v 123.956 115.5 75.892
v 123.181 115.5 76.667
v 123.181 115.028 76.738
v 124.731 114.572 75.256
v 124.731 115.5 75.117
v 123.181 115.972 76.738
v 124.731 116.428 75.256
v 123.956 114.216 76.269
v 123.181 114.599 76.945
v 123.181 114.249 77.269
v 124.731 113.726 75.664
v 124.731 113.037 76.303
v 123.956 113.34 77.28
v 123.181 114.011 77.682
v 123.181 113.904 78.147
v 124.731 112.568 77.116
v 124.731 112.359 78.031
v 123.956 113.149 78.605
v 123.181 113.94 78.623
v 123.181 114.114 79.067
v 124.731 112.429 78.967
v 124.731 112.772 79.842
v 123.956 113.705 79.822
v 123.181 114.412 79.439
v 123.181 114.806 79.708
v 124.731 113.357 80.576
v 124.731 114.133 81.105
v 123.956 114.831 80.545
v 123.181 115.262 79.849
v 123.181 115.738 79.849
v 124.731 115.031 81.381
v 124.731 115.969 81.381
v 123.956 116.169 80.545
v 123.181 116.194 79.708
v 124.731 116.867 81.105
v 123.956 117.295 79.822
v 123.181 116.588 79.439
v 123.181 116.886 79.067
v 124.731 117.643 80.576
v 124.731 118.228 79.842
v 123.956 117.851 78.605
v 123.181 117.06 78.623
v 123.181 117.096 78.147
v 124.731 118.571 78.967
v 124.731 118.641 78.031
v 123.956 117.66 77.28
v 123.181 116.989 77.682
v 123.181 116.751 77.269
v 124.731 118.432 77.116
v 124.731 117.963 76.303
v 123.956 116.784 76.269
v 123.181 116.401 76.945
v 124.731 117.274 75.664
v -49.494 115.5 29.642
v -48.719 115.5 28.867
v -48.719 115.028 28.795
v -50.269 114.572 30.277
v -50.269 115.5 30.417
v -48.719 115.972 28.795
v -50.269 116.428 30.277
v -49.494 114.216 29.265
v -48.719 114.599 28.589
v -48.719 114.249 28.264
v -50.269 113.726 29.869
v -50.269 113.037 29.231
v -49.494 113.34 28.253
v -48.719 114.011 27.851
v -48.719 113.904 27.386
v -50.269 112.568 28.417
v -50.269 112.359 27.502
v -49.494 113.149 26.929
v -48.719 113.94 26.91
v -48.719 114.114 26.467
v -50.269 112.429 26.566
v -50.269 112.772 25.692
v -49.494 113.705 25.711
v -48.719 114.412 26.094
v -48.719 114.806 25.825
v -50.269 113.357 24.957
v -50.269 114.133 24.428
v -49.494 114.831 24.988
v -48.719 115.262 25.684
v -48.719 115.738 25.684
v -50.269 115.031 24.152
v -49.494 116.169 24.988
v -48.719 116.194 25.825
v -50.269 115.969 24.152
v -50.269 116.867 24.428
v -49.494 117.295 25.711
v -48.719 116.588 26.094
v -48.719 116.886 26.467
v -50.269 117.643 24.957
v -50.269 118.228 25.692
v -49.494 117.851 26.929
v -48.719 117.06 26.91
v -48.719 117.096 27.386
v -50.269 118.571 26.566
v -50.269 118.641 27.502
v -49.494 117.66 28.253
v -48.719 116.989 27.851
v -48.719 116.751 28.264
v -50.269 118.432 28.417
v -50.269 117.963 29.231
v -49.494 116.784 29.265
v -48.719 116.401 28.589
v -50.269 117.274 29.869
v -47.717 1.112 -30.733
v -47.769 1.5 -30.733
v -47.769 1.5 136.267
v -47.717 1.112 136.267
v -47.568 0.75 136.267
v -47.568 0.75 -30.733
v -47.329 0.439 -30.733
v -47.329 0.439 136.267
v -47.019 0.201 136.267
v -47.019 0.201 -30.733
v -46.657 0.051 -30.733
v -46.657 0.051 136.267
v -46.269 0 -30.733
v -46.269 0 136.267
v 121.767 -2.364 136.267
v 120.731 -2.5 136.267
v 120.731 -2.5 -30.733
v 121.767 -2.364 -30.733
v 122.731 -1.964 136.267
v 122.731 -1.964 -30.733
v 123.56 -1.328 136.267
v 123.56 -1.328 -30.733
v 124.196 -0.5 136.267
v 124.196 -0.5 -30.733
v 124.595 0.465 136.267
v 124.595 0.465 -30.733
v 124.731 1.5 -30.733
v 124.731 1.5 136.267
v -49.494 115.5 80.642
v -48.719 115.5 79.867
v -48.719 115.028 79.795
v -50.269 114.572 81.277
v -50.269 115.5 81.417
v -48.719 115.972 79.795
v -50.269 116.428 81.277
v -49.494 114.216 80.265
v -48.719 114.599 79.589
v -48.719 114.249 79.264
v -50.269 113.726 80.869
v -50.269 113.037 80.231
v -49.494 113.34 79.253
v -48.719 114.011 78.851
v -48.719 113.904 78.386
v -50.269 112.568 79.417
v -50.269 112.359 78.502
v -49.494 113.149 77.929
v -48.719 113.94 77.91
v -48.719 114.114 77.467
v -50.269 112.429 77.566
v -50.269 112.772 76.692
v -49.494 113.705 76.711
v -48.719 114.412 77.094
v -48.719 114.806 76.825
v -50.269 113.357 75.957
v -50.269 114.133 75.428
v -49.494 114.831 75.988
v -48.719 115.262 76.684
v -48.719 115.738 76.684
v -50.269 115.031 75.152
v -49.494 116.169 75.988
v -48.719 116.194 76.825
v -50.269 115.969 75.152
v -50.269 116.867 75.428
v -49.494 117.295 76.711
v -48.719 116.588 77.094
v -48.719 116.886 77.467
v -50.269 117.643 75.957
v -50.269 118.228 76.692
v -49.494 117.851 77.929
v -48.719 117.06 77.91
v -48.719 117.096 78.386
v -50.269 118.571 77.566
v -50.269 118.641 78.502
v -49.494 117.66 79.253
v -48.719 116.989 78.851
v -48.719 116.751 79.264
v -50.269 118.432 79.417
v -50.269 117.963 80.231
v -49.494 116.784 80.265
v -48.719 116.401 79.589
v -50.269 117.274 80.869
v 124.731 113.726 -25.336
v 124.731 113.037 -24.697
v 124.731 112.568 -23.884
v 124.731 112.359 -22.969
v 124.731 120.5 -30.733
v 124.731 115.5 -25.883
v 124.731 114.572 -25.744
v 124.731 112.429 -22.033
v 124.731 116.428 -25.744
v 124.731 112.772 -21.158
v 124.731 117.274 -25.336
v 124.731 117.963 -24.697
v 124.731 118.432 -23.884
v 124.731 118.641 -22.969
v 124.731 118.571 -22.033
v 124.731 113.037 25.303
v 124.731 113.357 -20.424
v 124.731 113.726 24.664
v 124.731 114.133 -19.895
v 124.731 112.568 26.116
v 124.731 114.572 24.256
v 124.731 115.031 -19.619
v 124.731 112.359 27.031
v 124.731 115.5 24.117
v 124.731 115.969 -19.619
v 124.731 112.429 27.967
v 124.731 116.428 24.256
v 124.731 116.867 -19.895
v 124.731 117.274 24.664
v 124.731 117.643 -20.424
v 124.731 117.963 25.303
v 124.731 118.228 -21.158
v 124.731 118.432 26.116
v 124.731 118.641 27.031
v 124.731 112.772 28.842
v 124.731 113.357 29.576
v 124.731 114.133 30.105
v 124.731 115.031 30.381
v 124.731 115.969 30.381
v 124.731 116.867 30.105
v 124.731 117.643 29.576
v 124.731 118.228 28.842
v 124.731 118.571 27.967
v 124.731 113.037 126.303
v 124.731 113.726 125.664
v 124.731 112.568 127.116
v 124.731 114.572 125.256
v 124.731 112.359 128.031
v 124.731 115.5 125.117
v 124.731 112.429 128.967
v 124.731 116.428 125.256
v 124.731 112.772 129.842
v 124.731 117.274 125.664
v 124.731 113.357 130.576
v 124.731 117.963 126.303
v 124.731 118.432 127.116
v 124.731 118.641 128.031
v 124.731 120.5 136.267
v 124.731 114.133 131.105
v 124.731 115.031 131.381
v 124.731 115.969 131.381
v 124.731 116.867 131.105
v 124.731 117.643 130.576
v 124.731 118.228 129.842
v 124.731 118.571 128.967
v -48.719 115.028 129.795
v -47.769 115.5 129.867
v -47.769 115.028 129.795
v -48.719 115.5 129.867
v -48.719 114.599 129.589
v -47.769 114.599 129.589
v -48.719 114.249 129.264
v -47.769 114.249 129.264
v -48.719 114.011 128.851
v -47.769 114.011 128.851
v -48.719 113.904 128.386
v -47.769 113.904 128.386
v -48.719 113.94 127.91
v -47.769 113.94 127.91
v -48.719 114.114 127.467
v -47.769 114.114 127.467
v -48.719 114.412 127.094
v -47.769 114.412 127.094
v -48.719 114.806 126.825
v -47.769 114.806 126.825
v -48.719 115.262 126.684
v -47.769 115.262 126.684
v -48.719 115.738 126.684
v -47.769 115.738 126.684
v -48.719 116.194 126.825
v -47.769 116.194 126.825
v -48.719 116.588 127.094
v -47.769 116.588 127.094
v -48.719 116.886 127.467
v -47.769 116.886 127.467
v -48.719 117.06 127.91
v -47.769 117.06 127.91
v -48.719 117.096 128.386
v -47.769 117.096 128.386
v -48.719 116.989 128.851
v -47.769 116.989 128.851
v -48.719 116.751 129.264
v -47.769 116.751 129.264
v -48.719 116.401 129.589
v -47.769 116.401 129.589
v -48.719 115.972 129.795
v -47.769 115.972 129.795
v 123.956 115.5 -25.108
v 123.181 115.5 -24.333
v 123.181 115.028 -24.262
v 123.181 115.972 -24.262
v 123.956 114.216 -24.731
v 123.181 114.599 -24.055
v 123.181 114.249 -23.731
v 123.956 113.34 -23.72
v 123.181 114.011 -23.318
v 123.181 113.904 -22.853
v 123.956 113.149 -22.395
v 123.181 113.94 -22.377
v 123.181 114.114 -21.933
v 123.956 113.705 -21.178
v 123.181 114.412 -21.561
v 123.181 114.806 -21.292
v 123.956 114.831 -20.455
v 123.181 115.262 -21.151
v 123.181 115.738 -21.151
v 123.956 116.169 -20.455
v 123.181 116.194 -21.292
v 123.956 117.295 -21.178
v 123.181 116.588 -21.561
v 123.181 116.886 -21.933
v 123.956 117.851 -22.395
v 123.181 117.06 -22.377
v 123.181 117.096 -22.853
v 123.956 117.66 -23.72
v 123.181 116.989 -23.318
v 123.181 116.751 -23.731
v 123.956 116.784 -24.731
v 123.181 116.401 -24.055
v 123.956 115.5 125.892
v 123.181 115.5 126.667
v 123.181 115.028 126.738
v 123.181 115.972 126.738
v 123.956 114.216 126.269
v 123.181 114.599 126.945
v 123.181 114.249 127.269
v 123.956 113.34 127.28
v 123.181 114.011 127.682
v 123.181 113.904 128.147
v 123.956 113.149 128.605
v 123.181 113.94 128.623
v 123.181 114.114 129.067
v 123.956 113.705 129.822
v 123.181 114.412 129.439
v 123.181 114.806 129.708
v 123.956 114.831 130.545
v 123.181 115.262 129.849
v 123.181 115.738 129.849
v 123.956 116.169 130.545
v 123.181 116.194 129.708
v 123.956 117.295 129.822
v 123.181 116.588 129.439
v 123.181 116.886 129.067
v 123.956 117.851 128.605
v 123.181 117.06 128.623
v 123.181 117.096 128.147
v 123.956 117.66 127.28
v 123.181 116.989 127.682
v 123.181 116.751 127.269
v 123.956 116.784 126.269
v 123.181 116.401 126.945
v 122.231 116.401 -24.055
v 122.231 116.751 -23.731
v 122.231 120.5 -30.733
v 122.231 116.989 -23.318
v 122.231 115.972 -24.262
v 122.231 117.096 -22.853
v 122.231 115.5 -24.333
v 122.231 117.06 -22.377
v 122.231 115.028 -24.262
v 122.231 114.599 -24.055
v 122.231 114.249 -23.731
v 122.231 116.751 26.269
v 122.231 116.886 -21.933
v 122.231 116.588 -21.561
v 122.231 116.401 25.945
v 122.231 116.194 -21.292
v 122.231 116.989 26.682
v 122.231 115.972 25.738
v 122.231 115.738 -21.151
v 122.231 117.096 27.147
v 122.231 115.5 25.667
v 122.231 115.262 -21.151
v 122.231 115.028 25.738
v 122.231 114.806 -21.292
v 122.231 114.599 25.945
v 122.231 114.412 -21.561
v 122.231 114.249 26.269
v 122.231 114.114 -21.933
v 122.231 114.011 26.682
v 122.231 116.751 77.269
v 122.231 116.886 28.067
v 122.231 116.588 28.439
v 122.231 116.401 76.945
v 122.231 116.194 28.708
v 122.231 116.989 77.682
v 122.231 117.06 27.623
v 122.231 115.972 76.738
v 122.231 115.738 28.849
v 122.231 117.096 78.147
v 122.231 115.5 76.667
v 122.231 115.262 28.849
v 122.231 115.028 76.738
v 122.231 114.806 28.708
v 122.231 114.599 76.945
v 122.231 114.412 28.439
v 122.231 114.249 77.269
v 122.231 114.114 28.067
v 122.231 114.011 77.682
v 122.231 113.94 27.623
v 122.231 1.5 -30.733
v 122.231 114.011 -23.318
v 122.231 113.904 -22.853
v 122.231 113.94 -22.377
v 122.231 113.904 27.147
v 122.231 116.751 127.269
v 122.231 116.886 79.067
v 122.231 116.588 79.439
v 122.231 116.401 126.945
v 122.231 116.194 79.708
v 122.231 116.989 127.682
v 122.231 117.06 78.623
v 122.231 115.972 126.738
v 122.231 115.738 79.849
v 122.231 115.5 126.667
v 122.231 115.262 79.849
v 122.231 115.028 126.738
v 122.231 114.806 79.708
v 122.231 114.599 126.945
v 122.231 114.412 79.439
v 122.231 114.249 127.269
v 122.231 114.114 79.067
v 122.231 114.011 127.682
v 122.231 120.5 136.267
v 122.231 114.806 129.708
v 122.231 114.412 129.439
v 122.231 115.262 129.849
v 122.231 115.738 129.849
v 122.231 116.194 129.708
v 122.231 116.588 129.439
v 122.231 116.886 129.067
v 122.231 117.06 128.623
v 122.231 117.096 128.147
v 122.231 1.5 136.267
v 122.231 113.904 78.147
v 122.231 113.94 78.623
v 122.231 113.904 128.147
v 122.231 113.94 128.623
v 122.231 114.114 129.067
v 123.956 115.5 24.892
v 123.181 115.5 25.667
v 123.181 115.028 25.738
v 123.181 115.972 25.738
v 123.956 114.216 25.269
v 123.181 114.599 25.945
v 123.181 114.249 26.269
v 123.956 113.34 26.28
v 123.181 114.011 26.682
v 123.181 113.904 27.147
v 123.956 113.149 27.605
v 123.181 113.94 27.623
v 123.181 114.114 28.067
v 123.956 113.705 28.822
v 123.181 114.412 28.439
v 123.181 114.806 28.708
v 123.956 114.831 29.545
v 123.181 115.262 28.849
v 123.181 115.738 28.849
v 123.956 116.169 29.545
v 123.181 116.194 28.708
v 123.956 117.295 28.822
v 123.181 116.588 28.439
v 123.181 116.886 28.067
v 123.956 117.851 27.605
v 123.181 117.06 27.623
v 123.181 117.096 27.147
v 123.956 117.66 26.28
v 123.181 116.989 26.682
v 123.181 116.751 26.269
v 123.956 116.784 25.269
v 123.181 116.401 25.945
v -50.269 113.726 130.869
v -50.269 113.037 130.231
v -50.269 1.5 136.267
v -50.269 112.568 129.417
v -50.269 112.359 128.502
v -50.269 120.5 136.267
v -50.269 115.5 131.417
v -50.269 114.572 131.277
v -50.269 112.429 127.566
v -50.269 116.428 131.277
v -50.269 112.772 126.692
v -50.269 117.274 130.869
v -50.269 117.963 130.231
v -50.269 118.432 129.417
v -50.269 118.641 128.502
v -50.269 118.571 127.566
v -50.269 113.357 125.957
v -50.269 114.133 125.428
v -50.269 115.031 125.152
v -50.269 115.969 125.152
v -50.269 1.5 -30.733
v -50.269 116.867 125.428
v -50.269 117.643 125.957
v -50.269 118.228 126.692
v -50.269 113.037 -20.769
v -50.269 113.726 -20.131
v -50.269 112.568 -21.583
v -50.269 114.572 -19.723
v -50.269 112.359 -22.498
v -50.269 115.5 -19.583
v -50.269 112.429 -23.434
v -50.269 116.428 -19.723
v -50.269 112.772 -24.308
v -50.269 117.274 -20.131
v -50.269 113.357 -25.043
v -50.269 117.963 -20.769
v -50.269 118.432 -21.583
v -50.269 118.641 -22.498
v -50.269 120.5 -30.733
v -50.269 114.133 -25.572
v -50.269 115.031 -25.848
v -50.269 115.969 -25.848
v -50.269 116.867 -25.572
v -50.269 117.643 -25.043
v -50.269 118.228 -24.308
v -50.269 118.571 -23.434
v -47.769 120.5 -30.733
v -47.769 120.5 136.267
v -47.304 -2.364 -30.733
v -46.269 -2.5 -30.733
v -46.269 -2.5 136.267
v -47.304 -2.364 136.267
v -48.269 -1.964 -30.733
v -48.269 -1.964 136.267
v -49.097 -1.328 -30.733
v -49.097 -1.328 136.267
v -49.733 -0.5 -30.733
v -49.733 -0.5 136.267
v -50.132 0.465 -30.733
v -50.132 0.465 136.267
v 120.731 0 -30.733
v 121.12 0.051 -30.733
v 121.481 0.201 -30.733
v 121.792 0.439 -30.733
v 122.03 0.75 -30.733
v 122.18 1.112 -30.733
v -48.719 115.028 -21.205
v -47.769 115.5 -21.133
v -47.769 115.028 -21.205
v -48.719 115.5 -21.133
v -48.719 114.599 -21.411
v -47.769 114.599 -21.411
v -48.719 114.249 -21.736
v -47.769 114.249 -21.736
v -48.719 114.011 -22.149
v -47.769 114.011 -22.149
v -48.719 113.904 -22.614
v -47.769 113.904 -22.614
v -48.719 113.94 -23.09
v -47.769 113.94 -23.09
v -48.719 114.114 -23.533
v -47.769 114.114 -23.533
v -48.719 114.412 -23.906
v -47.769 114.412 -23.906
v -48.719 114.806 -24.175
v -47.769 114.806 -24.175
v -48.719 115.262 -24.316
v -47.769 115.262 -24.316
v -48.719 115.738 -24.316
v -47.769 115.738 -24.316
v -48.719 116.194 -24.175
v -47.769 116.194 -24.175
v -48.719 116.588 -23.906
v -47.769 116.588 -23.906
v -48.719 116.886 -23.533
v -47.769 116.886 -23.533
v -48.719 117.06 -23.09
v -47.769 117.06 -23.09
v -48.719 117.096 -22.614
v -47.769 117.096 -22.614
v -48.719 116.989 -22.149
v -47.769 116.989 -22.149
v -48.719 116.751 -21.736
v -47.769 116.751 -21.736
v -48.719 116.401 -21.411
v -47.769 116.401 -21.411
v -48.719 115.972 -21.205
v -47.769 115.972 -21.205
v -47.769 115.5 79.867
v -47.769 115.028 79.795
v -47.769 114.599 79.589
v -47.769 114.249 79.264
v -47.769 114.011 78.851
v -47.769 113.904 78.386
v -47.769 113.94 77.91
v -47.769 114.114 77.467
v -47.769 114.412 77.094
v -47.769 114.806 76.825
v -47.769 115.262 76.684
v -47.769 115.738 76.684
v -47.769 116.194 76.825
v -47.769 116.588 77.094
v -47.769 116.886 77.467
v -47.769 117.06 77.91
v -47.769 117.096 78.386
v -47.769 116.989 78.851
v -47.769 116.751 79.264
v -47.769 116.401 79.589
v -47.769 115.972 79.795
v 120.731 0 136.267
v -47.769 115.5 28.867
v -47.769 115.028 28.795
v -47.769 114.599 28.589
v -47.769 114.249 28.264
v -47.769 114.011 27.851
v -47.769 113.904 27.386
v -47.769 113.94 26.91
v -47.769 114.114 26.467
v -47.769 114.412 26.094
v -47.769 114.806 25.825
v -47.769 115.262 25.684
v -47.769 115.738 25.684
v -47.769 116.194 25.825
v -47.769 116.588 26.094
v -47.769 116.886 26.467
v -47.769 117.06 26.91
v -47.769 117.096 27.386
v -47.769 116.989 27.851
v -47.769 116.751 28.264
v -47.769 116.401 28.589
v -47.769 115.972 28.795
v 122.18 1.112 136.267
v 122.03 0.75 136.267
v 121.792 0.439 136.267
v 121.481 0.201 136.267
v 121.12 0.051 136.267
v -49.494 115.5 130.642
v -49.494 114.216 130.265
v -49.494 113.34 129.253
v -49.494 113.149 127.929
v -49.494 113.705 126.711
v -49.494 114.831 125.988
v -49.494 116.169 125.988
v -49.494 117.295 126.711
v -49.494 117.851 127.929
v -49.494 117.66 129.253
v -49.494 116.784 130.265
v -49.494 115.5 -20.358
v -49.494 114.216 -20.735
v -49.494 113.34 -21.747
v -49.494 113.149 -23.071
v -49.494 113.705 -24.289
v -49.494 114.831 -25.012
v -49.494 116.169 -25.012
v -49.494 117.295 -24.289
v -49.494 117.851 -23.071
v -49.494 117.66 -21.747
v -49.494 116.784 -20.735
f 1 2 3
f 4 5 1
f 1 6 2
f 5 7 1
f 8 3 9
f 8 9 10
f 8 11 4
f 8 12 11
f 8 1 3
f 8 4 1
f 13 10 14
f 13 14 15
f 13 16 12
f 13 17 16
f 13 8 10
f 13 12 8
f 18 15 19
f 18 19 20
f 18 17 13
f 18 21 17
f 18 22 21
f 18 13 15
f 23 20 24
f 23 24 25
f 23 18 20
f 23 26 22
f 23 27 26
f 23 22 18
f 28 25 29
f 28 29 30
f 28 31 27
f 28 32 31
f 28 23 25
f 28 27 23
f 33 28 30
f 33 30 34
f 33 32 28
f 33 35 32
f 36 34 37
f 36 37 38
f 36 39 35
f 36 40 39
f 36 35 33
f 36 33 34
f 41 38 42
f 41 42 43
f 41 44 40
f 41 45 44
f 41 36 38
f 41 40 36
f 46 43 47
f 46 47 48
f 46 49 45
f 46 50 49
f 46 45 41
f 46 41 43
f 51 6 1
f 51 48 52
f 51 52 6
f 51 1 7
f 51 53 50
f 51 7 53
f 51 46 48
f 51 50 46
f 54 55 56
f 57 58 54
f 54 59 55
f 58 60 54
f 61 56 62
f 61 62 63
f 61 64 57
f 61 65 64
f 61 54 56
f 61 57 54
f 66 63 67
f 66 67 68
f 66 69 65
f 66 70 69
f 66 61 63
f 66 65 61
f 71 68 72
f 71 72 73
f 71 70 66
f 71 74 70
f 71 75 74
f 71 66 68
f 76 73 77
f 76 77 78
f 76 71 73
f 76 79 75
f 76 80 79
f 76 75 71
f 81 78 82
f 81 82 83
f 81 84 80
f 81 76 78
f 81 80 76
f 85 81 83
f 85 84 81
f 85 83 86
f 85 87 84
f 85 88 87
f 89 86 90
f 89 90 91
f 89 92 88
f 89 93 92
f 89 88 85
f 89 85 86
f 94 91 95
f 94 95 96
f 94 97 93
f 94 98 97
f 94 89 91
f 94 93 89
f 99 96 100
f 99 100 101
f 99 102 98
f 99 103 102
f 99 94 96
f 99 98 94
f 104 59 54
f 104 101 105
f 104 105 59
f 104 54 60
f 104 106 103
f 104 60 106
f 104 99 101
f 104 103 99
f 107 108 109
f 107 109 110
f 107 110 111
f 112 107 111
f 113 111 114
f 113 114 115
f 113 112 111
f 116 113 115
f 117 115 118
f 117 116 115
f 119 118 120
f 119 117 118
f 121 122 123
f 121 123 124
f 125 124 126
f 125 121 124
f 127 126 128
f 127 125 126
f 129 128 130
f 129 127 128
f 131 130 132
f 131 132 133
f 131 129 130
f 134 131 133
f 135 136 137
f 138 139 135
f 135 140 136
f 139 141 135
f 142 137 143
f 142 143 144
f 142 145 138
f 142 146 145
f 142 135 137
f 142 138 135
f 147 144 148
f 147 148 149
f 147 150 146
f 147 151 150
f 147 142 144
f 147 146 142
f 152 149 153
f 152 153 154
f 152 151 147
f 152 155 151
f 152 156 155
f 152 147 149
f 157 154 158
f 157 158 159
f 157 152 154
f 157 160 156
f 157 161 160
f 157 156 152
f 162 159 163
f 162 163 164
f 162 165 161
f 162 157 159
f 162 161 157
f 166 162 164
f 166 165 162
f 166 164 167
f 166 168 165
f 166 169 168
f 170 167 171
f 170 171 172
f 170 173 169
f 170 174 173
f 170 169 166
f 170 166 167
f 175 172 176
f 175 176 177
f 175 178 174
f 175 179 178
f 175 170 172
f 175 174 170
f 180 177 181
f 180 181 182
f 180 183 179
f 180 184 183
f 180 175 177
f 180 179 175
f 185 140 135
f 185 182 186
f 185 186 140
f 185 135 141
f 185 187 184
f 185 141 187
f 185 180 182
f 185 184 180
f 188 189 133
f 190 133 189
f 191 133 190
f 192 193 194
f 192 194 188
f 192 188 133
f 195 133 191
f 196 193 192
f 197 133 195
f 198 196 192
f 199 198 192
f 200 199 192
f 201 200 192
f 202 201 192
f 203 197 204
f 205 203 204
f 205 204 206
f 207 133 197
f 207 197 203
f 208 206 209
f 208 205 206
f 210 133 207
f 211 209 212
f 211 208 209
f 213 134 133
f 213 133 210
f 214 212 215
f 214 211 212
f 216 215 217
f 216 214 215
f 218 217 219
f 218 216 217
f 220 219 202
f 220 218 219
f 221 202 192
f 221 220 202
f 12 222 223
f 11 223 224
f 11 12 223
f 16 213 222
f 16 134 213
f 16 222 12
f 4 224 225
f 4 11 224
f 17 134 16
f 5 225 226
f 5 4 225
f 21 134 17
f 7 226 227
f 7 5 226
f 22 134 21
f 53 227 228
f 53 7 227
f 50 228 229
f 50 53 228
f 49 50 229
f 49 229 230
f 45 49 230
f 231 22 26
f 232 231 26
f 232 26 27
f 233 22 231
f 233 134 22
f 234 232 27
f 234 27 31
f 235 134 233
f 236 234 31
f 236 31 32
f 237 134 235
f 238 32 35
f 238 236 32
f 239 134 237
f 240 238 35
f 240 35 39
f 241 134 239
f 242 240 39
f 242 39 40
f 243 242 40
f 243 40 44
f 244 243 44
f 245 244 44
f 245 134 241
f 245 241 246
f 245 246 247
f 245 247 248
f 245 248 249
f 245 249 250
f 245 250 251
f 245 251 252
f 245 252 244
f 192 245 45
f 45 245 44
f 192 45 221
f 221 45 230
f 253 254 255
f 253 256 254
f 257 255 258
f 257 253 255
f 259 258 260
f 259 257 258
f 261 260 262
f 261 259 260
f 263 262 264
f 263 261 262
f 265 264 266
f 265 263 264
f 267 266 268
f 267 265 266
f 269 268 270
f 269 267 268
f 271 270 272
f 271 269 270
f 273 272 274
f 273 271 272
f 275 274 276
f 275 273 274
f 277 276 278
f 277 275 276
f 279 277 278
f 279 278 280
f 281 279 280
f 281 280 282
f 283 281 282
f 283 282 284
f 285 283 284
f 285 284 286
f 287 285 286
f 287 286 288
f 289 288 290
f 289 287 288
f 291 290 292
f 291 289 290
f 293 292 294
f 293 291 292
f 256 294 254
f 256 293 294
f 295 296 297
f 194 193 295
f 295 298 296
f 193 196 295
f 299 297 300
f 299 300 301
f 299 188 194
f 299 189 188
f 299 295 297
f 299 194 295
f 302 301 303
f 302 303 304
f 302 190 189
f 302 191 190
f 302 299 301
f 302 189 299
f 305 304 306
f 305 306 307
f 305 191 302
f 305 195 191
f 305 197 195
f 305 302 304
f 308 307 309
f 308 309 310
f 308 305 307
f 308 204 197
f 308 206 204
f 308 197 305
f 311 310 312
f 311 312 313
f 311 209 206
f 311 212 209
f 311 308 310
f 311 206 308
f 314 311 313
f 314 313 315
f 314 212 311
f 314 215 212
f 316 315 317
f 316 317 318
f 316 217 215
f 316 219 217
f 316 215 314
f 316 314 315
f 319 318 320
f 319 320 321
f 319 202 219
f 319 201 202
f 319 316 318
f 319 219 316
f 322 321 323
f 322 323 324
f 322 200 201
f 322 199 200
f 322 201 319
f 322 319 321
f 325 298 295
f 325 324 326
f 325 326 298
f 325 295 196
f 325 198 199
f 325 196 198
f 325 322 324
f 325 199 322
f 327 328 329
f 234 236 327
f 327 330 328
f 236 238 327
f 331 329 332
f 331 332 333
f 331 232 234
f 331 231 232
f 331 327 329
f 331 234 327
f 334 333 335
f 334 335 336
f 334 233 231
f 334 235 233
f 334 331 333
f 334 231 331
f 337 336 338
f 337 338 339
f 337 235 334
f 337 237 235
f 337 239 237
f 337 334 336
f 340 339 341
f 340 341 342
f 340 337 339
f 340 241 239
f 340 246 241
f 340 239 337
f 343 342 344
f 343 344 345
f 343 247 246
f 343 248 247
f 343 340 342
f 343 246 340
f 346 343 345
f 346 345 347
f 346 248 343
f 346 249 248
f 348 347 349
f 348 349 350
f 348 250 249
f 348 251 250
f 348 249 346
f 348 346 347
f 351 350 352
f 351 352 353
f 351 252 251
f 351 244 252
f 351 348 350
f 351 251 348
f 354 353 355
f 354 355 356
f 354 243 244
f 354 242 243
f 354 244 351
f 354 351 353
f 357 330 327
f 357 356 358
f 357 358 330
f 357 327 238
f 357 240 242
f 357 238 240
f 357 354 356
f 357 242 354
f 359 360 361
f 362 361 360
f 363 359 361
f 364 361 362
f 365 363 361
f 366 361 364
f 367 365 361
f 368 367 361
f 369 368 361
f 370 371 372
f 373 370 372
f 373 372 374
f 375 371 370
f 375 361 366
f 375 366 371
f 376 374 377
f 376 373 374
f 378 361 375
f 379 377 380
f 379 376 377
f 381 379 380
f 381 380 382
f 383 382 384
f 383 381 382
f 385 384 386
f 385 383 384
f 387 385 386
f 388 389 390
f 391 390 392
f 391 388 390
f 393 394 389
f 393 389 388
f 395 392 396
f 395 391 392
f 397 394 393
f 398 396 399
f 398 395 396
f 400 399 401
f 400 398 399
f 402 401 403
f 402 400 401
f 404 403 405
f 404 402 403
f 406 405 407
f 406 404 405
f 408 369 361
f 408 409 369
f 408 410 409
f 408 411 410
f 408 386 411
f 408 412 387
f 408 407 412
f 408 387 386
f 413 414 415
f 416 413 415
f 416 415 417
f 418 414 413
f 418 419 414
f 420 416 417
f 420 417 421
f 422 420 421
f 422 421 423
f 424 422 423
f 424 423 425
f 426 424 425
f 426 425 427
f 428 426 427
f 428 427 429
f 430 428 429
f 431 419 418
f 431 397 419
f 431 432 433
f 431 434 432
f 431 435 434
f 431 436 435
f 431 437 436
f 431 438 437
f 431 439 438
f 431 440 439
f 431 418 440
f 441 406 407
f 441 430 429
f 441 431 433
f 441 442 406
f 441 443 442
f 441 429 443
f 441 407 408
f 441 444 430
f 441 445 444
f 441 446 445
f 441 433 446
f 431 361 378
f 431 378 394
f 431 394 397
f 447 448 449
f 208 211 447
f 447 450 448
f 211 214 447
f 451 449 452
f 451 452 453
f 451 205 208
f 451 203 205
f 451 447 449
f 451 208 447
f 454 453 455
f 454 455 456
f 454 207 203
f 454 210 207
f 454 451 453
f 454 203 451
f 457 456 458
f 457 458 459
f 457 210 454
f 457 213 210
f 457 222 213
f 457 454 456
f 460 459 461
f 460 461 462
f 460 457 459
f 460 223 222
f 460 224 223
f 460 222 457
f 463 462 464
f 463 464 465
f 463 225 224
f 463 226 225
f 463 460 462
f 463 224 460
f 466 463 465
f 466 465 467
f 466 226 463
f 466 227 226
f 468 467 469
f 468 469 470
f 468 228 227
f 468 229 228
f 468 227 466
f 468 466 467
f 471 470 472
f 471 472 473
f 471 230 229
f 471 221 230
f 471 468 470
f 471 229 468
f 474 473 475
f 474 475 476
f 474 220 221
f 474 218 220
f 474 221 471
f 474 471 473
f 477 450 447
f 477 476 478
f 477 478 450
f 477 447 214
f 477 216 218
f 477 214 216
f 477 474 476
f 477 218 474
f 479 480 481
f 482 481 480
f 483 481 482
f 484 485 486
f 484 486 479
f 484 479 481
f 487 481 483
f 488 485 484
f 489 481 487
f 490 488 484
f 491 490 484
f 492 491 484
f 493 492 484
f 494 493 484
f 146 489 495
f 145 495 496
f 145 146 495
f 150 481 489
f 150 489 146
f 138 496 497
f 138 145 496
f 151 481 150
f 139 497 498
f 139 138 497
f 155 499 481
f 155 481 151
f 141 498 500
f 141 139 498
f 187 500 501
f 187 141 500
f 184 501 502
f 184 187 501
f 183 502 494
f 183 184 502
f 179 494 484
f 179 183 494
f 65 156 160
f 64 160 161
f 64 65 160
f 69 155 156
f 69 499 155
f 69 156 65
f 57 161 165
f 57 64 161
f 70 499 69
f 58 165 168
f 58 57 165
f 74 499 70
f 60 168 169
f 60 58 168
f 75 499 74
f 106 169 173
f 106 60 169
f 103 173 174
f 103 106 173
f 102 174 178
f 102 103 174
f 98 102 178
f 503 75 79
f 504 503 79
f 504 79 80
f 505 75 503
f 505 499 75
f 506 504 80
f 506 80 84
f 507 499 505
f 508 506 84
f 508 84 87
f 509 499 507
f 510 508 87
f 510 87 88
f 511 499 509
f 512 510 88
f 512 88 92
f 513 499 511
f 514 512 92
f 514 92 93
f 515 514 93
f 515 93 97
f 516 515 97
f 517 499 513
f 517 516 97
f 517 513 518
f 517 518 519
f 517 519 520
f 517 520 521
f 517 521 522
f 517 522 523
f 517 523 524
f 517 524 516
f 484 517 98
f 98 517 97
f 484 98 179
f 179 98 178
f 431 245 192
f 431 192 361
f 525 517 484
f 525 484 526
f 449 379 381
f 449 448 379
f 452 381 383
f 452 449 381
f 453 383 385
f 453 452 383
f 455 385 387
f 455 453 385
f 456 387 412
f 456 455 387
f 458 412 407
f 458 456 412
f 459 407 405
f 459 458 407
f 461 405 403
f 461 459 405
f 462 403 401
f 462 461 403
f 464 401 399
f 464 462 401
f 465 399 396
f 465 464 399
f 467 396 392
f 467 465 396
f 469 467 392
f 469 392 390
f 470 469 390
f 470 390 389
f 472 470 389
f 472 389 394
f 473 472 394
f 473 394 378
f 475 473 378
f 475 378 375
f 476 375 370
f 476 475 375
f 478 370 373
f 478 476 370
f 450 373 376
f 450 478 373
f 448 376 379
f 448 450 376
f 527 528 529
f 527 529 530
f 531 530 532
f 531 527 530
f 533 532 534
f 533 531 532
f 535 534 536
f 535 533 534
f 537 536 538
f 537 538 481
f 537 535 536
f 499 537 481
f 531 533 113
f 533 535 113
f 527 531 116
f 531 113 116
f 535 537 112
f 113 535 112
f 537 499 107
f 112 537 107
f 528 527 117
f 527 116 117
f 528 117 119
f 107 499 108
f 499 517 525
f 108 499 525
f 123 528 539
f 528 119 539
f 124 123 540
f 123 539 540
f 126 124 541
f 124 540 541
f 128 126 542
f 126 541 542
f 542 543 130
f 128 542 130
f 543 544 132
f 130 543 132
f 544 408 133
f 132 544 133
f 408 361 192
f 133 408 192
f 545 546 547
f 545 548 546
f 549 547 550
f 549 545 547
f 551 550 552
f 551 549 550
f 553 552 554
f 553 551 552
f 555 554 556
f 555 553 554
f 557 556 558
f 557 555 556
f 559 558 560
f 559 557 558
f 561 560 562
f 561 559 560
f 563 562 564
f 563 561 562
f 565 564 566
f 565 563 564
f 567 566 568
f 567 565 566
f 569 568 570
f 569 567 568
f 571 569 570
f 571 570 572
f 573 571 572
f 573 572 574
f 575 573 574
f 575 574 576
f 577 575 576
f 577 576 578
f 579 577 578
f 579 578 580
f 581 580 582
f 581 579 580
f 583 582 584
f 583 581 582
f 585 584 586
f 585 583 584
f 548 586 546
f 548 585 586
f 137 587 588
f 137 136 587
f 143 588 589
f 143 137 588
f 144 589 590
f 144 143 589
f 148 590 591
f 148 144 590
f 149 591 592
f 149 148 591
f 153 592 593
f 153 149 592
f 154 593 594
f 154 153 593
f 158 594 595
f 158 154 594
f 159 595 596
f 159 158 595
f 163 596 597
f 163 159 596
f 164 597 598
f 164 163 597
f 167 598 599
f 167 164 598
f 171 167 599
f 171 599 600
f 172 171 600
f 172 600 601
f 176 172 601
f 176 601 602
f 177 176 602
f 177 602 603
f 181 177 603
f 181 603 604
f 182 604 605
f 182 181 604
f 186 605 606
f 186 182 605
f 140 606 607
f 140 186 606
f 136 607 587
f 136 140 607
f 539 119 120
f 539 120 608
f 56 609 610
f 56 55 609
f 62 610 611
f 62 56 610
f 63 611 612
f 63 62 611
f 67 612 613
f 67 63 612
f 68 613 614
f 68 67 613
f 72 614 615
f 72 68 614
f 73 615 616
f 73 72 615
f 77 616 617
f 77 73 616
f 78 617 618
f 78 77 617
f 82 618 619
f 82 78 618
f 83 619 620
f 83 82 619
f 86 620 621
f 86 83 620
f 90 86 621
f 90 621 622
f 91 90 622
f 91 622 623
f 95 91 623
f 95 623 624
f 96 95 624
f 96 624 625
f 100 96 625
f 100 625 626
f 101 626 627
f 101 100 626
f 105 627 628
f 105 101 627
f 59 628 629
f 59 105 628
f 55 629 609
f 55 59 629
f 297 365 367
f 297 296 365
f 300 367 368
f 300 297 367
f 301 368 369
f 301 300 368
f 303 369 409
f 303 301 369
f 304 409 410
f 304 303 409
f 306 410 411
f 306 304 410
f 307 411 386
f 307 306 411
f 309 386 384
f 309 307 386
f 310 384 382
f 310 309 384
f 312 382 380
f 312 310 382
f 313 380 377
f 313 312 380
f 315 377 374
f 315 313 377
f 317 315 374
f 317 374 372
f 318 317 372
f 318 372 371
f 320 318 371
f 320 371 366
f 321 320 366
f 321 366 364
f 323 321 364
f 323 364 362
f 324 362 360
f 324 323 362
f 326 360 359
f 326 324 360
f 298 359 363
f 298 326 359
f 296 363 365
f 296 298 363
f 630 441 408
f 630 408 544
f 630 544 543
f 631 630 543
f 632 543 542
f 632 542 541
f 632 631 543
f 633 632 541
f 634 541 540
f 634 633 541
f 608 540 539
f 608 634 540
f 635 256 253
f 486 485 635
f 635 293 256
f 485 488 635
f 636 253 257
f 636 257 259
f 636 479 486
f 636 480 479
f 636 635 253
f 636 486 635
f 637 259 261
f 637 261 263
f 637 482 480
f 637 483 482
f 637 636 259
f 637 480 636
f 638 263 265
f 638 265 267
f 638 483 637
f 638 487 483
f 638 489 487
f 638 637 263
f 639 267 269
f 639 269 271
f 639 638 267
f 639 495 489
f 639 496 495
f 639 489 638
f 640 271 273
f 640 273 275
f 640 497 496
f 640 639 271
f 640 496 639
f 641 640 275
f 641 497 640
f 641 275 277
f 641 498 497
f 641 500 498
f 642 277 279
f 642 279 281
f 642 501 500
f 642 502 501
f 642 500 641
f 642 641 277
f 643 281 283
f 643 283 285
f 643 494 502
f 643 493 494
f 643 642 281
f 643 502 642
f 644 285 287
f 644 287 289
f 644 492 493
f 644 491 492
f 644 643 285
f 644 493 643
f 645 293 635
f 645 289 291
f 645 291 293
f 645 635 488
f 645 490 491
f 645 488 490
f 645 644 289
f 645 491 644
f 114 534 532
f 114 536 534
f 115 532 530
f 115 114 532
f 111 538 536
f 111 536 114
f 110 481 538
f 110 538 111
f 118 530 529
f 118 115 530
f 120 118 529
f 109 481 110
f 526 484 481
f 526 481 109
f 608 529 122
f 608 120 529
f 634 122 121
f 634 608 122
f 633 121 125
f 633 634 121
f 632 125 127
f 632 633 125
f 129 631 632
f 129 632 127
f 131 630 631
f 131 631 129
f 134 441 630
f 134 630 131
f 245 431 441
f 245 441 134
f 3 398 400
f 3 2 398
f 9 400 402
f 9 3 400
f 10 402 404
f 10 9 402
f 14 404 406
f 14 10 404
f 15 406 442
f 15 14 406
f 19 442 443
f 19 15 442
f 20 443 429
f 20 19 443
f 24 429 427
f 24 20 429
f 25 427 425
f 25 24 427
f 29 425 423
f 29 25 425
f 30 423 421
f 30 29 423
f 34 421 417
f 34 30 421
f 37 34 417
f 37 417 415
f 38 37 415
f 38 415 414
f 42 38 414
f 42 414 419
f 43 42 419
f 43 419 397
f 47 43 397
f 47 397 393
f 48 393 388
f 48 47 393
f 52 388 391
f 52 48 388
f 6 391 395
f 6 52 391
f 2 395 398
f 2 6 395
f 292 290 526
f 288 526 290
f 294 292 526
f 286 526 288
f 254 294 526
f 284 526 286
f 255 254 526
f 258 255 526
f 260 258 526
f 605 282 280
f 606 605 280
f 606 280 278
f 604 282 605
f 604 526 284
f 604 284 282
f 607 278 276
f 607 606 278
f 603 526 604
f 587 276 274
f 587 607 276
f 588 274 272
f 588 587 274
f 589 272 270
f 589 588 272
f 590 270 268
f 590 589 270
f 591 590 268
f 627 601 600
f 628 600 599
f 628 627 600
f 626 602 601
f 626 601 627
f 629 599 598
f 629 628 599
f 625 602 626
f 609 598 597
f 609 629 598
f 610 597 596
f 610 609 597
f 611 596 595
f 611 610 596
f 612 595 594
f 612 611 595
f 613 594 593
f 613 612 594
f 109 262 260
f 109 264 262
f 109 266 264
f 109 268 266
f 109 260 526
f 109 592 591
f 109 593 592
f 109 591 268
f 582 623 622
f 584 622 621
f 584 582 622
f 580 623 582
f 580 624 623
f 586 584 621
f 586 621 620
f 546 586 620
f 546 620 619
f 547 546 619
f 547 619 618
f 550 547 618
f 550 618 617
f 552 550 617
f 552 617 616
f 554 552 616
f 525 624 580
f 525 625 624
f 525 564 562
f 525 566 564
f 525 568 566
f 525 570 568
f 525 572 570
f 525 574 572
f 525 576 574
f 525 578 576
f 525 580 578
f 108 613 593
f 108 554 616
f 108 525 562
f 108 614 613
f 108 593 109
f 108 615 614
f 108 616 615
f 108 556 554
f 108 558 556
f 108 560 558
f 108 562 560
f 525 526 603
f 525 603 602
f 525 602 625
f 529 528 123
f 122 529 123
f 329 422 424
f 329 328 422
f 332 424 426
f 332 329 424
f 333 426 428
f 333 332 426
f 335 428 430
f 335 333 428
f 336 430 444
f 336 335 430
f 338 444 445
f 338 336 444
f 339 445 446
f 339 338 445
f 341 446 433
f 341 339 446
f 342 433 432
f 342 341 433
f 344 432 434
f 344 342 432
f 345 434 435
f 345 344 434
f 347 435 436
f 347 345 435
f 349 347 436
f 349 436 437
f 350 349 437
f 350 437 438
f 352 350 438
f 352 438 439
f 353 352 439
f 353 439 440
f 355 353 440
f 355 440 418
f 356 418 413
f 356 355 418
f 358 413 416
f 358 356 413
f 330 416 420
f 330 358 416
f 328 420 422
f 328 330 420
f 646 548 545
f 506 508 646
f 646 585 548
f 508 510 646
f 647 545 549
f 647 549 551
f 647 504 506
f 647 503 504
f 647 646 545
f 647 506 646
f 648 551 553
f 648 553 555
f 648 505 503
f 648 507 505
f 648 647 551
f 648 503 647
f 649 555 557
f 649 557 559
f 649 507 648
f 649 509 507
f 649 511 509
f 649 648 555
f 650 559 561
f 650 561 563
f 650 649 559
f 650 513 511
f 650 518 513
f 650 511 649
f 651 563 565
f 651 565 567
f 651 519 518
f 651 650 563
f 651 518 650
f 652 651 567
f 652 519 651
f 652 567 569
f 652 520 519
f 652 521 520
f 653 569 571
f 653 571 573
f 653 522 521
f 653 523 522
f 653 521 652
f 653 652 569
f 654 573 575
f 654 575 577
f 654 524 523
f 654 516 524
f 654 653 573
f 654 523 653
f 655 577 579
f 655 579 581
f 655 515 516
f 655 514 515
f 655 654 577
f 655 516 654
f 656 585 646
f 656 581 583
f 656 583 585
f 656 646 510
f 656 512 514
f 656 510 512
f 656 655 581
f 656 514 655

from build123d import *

# Parameters (mm, degrees)
SKETCH_238_W                                   = 170
SKETCH_238_H                                   = 167
BASE_FLANGE1_DEPTH                             = 2.5
EDGE_FLANGE1_STRIP_W                           = 13
EDGE_FLANGE1_STRIP_H                           = 2.5
EDGE_FLANGE1_STRIP_CUT_DEPTH                   = 167
EDGE_FLANGE1_DEPTH                             = 167
EDGE_FLANGE2_STRIP_W                           = 13
EDGE_FLANGE2_STRIP_H                           = 2.5
EDGE_FLANGE2_STRIP_CUT_DEPTH                   = 167
EDGE_FLANGE2_DEPTH                             = 167
CSK_FOR_M3_FLAT_HEAD_MACHINE_SCREW1_AT_2_COUNT = 2
CSK_FOR_M3_FLAT_HEAD_MACHINE_SCREW1_AT_2_PITCH = 50
CSK_FOR_M3_FLAT_HEAD_MACHINE_SCREW1_AT_3_COUNT = 2
CSK_FOR_M3_FLAT_HEAD_MACHINE_SCREW1_AT_3_PITCH = 101
CSK_FOR_M3_FLAT_HEAD_MACHINE_SCREW1_AT_4_COUNT = 2
CSK_FOR_M3_FLAT_HEAD_MACHINE_SCREW1_AT_4_PITCH = 151
CSK_FOR_M3_FLAT_HEAD_MACHINE_SCREW2_AT_2_COUNT = 2
CSK_FOR_M3_FLAT_HEAD_MACHINE_SCREW2_AT_2_PITCH = 50
CSK_FOR_M3_FLAT_HEAD_MACHINE_SCREW2_AT_3_COUNT = 2
CSK_FOR_M3_FLAT_HEAD_MACHINE_SCREW2_AT_3_PITCH = 101
CSK_FOR_M3_FLAT_HEAD_MACHINE_SCREW2_AT_4_COUNT = 2
CSK_FOR_M3_FLAT_HEAD_MACHINE_SCREW2_AT_4_PITCH = 151


# Sheet-metal steps are written as plain solids
with BuildPart() as part:
    # Sketch 238 → Base-Flange1 (new body)
    with BuildSketch(Plane(origin=(0, 0, 0), x_dir=(1, 0, 0), z_dir=(0, 1, 0))):
        with Locations((37.231404959, -52.766528926)):
            Rectangle(SKETCH_238_W, SKETCH_238_H)
    extrude(amount=-BASE_FLANGE1_DEPTH)

    # Edge-Flange1 strip (across the edge) → Edge-Flange1 strip cut (cut)
    with BuildSketch(Plane(origin=(-47.768595041, 0, -30.733471074), x_dir=(1, 0, 0), z_dir=(0, 0, 1))):
        with Locations((-5, -1.25)):
            Rectangle(EDGE_FLANGE1_STRIP_W, EDGE_FLANGE1_STRIP_H)
    extrude(amount=EDGE_FLANGE1_STRIP_CUT_DEPTH, mode=Mode.SUBTRACT)

    # Edge-Flange1 section (across the edge) → Edge-Flange1 (add)
    with BuildSketch(Plane(origin=(-47.768595041, 0, -30.733471074), x_dir=(1, 0, 0), z_dir=(0, 0, 1))):
        with BuildLine():
            Line((-2.5, 1.5), (-2.5, 120.5))
            Line((-2.5, 120.5), (0, 120.5))
            Line((0, 120.5), (0, 1.5))
            ThreePointArc((0, 1.5), (0.439339828, 0.439339828), (1.5, 0))
            Line((1.5, 0), (1.5, -2.5))
            ThreePointArc((1.5, -2.5), (-1.328427125, -1.328427125), (-2.5, 1.5))
        make_face()
    extrude(amount=EDGE_FLANGE1_DEPTH)

    # Edge-Flange2 strip (across the edge) → Edge-Flange2 strip cut (cut)
    with BuildSketch(Plane(origin=(122.231404959, 0, 136.266528926), x_dir=(-1, 0, 0), z_dir=(0, 0, -1))):
        with Locations((-5, -1.25)):
            Rectangle(EDGE_FLANGE2_STRIP_W, EDGE_FLANGE2_STRIP_H)
    extrude(amount=EDGE_FLANGE2_STRIP_CUT_DEPTH, mode=Mode.SUBTRACT)

    # Edge-Flange2 section (across the edge) → Edge-Flange2 (add)
    with BuildSketch(Plane(origin=(122.231404959, 0, 136.266528926), x_dir=(-1, 0, 0), z_dir=(0, 0, -1))):
        with BuildLine():
            Line((-2.5, 1.5), (-2.5, 120.5))
            Line((-2.5, 120.5), (0, 120.5))
            Line((0, 120.5), (0, 1.5))
            ThreePointArc((0, 1.5), (0.439339828, 0.439339828), (1.5, 0))
            Line((1.5, 0), (1.5, -2.5))
            ThreePointArc((1.5, -2.5), (-1.328427125, -1.328427125), (-2.5, 1.5))
        make_face()
    extrude(amount=EDGE_FLANGE2_DEPTH)

    # Sketch13 → CSK for M3 Flat Head Machine Screw1 (revolve, cut)
    with BuildSketch(Plane(origin=(-50.268595041, 115.5, 128.266528926), x_dir=(0, 0, 1), z_dir=(0, 1, 0))):
        Polygon((0, 0), (0, 2.5), (1.6, 2.5), (1.6, 1.55), (3.15, 0), align=None)
    csk_for_m3_flat_head_machine_screw1 = revolve(axis=Axis((-56.618595041, 115.5, 128.266528926), (1, 0, 0)), mode=Mode.SUBTRACT)

    # CSK for M3 Flat Head Machine Screw1 at 2: CSK for M3 Flat Head Machine Screw1 ×2
    with Locations(*[(0, 0, -i * CSK_FOR_M3_FLAT_HEAD_MACHINE_SCREW1_AT_2_PITCH) for i in range(1, CSK_FOR_M3_FLAT_HEAD_MACHINE_SCREW1_AT_2_COUNT)]):
        add(csk_for_m3_flat_head_machine_screw1, mode=Mode.SUBTRACT)

    # CSK for M3 Flat Head Machine Screw1 at 3: CSK for M3 Flat Head Machine Screw1 ×2
    with Locations(*[(0, 0, -i * CSK_FOR_M3_FLAT_HEAD_MACHINE_SCREW1_AT_3_PITCH) for i in range(1, CSK_FOR_M3_FLAT_HEAD_MACHINE_SCREW1_AT_3_COUNT)]):
        add(csk_for_m3_flat_head_machine_screw1, mode=Mode.SUBTRACT)

    # CSK for M3 Flat Head Machine Screw1 at 4: CSK for M3 Flat Head Machine Screw1 ×2
    with Locations(*[(0, 0, -i * CSK_FOR_M3_FLAT_HEAD_MACHINE_SCREW1_AT_4_PITCH) for i in range(1, CSK_FOR_M3_FLAT_HEAD_MACHINE_SCREW1_AT_4_COUNT)]):
        add(csk_for_m3_flat_head_machine_screw1, mode=Mode.SUBTRACT)

    # Sketch15 → CSK for M3 Flat Head Machine Screw2 (revolve, cut)
    with BuildSketch(Plane(origin=(124.731404959, 115.5, -22.733471074), x_dir=(0, 0, -1), z_dir=(0, 1, 0))):
        Polygon((0, 0), (0, 2.5), (1.6, 2.5), (1.6, 1.55), (3.15, 0), align=None)
    csk_for_m3_flat_head_machine_screw2 = revolve(axis=Axis((131.081404959, 115.5, -22.733471074), (-1, 0, 0)), mode=Mode.SUBTRACT)

    # CSK for M3 Flat Head Machine Screw2 at 2: CSK for M3 Flat Head Machine Screw2 ×2
    with Locations(*[(0, 0, i * CSK_FOR_M3_FLAT_HEAD_MACHINE_SCREW2_AT_2_PITCH) for i in range(1, CSK_FOR_M3_FLAT_HEAD_MACHINE_SCREW2_AT_2_COUNT)]):
        add(csk_for_m3_flat_head_machine_screw2, mode=Mode.SUBTRACT)

    # CSK for M3 Flat Head Machine Screw2 at 3: CSK for M3 Flat Head Machine Screw2 ×2
    with Locations(*[(0, 0, i * CSK_FOR_M3_FLAT_HEAD_MACHINE_SCREW2_AT_3_PITCH) for i in range(1, CSK_FOR_M3_FLAT_HEAD_MACHINE_SCREW2_AT_3_COUNT)]):
        add(csk_for_m3_flat_head_machine_screw2, mode=Mode.SUBTRACT)

    # CSK for M3 Flat Head Machine Screw2 at 4: CSK for M3 Flat Head Machine Screw2 ×2
    with Locations(*[(0, 0, i * CSK_FOR_M3_FLAT_HEAD_MACHINE_SCREW2_AT_4_PITCH) for i in range(1, CSK_FOR_M3_FLAT_HEAD_MACHINE_SCREW2_AT_4_COUNT)]):
        add(csk_for_m3_flat_head_machine_screw2, mode=Mode.SUBTRACT)


solid = part.part
